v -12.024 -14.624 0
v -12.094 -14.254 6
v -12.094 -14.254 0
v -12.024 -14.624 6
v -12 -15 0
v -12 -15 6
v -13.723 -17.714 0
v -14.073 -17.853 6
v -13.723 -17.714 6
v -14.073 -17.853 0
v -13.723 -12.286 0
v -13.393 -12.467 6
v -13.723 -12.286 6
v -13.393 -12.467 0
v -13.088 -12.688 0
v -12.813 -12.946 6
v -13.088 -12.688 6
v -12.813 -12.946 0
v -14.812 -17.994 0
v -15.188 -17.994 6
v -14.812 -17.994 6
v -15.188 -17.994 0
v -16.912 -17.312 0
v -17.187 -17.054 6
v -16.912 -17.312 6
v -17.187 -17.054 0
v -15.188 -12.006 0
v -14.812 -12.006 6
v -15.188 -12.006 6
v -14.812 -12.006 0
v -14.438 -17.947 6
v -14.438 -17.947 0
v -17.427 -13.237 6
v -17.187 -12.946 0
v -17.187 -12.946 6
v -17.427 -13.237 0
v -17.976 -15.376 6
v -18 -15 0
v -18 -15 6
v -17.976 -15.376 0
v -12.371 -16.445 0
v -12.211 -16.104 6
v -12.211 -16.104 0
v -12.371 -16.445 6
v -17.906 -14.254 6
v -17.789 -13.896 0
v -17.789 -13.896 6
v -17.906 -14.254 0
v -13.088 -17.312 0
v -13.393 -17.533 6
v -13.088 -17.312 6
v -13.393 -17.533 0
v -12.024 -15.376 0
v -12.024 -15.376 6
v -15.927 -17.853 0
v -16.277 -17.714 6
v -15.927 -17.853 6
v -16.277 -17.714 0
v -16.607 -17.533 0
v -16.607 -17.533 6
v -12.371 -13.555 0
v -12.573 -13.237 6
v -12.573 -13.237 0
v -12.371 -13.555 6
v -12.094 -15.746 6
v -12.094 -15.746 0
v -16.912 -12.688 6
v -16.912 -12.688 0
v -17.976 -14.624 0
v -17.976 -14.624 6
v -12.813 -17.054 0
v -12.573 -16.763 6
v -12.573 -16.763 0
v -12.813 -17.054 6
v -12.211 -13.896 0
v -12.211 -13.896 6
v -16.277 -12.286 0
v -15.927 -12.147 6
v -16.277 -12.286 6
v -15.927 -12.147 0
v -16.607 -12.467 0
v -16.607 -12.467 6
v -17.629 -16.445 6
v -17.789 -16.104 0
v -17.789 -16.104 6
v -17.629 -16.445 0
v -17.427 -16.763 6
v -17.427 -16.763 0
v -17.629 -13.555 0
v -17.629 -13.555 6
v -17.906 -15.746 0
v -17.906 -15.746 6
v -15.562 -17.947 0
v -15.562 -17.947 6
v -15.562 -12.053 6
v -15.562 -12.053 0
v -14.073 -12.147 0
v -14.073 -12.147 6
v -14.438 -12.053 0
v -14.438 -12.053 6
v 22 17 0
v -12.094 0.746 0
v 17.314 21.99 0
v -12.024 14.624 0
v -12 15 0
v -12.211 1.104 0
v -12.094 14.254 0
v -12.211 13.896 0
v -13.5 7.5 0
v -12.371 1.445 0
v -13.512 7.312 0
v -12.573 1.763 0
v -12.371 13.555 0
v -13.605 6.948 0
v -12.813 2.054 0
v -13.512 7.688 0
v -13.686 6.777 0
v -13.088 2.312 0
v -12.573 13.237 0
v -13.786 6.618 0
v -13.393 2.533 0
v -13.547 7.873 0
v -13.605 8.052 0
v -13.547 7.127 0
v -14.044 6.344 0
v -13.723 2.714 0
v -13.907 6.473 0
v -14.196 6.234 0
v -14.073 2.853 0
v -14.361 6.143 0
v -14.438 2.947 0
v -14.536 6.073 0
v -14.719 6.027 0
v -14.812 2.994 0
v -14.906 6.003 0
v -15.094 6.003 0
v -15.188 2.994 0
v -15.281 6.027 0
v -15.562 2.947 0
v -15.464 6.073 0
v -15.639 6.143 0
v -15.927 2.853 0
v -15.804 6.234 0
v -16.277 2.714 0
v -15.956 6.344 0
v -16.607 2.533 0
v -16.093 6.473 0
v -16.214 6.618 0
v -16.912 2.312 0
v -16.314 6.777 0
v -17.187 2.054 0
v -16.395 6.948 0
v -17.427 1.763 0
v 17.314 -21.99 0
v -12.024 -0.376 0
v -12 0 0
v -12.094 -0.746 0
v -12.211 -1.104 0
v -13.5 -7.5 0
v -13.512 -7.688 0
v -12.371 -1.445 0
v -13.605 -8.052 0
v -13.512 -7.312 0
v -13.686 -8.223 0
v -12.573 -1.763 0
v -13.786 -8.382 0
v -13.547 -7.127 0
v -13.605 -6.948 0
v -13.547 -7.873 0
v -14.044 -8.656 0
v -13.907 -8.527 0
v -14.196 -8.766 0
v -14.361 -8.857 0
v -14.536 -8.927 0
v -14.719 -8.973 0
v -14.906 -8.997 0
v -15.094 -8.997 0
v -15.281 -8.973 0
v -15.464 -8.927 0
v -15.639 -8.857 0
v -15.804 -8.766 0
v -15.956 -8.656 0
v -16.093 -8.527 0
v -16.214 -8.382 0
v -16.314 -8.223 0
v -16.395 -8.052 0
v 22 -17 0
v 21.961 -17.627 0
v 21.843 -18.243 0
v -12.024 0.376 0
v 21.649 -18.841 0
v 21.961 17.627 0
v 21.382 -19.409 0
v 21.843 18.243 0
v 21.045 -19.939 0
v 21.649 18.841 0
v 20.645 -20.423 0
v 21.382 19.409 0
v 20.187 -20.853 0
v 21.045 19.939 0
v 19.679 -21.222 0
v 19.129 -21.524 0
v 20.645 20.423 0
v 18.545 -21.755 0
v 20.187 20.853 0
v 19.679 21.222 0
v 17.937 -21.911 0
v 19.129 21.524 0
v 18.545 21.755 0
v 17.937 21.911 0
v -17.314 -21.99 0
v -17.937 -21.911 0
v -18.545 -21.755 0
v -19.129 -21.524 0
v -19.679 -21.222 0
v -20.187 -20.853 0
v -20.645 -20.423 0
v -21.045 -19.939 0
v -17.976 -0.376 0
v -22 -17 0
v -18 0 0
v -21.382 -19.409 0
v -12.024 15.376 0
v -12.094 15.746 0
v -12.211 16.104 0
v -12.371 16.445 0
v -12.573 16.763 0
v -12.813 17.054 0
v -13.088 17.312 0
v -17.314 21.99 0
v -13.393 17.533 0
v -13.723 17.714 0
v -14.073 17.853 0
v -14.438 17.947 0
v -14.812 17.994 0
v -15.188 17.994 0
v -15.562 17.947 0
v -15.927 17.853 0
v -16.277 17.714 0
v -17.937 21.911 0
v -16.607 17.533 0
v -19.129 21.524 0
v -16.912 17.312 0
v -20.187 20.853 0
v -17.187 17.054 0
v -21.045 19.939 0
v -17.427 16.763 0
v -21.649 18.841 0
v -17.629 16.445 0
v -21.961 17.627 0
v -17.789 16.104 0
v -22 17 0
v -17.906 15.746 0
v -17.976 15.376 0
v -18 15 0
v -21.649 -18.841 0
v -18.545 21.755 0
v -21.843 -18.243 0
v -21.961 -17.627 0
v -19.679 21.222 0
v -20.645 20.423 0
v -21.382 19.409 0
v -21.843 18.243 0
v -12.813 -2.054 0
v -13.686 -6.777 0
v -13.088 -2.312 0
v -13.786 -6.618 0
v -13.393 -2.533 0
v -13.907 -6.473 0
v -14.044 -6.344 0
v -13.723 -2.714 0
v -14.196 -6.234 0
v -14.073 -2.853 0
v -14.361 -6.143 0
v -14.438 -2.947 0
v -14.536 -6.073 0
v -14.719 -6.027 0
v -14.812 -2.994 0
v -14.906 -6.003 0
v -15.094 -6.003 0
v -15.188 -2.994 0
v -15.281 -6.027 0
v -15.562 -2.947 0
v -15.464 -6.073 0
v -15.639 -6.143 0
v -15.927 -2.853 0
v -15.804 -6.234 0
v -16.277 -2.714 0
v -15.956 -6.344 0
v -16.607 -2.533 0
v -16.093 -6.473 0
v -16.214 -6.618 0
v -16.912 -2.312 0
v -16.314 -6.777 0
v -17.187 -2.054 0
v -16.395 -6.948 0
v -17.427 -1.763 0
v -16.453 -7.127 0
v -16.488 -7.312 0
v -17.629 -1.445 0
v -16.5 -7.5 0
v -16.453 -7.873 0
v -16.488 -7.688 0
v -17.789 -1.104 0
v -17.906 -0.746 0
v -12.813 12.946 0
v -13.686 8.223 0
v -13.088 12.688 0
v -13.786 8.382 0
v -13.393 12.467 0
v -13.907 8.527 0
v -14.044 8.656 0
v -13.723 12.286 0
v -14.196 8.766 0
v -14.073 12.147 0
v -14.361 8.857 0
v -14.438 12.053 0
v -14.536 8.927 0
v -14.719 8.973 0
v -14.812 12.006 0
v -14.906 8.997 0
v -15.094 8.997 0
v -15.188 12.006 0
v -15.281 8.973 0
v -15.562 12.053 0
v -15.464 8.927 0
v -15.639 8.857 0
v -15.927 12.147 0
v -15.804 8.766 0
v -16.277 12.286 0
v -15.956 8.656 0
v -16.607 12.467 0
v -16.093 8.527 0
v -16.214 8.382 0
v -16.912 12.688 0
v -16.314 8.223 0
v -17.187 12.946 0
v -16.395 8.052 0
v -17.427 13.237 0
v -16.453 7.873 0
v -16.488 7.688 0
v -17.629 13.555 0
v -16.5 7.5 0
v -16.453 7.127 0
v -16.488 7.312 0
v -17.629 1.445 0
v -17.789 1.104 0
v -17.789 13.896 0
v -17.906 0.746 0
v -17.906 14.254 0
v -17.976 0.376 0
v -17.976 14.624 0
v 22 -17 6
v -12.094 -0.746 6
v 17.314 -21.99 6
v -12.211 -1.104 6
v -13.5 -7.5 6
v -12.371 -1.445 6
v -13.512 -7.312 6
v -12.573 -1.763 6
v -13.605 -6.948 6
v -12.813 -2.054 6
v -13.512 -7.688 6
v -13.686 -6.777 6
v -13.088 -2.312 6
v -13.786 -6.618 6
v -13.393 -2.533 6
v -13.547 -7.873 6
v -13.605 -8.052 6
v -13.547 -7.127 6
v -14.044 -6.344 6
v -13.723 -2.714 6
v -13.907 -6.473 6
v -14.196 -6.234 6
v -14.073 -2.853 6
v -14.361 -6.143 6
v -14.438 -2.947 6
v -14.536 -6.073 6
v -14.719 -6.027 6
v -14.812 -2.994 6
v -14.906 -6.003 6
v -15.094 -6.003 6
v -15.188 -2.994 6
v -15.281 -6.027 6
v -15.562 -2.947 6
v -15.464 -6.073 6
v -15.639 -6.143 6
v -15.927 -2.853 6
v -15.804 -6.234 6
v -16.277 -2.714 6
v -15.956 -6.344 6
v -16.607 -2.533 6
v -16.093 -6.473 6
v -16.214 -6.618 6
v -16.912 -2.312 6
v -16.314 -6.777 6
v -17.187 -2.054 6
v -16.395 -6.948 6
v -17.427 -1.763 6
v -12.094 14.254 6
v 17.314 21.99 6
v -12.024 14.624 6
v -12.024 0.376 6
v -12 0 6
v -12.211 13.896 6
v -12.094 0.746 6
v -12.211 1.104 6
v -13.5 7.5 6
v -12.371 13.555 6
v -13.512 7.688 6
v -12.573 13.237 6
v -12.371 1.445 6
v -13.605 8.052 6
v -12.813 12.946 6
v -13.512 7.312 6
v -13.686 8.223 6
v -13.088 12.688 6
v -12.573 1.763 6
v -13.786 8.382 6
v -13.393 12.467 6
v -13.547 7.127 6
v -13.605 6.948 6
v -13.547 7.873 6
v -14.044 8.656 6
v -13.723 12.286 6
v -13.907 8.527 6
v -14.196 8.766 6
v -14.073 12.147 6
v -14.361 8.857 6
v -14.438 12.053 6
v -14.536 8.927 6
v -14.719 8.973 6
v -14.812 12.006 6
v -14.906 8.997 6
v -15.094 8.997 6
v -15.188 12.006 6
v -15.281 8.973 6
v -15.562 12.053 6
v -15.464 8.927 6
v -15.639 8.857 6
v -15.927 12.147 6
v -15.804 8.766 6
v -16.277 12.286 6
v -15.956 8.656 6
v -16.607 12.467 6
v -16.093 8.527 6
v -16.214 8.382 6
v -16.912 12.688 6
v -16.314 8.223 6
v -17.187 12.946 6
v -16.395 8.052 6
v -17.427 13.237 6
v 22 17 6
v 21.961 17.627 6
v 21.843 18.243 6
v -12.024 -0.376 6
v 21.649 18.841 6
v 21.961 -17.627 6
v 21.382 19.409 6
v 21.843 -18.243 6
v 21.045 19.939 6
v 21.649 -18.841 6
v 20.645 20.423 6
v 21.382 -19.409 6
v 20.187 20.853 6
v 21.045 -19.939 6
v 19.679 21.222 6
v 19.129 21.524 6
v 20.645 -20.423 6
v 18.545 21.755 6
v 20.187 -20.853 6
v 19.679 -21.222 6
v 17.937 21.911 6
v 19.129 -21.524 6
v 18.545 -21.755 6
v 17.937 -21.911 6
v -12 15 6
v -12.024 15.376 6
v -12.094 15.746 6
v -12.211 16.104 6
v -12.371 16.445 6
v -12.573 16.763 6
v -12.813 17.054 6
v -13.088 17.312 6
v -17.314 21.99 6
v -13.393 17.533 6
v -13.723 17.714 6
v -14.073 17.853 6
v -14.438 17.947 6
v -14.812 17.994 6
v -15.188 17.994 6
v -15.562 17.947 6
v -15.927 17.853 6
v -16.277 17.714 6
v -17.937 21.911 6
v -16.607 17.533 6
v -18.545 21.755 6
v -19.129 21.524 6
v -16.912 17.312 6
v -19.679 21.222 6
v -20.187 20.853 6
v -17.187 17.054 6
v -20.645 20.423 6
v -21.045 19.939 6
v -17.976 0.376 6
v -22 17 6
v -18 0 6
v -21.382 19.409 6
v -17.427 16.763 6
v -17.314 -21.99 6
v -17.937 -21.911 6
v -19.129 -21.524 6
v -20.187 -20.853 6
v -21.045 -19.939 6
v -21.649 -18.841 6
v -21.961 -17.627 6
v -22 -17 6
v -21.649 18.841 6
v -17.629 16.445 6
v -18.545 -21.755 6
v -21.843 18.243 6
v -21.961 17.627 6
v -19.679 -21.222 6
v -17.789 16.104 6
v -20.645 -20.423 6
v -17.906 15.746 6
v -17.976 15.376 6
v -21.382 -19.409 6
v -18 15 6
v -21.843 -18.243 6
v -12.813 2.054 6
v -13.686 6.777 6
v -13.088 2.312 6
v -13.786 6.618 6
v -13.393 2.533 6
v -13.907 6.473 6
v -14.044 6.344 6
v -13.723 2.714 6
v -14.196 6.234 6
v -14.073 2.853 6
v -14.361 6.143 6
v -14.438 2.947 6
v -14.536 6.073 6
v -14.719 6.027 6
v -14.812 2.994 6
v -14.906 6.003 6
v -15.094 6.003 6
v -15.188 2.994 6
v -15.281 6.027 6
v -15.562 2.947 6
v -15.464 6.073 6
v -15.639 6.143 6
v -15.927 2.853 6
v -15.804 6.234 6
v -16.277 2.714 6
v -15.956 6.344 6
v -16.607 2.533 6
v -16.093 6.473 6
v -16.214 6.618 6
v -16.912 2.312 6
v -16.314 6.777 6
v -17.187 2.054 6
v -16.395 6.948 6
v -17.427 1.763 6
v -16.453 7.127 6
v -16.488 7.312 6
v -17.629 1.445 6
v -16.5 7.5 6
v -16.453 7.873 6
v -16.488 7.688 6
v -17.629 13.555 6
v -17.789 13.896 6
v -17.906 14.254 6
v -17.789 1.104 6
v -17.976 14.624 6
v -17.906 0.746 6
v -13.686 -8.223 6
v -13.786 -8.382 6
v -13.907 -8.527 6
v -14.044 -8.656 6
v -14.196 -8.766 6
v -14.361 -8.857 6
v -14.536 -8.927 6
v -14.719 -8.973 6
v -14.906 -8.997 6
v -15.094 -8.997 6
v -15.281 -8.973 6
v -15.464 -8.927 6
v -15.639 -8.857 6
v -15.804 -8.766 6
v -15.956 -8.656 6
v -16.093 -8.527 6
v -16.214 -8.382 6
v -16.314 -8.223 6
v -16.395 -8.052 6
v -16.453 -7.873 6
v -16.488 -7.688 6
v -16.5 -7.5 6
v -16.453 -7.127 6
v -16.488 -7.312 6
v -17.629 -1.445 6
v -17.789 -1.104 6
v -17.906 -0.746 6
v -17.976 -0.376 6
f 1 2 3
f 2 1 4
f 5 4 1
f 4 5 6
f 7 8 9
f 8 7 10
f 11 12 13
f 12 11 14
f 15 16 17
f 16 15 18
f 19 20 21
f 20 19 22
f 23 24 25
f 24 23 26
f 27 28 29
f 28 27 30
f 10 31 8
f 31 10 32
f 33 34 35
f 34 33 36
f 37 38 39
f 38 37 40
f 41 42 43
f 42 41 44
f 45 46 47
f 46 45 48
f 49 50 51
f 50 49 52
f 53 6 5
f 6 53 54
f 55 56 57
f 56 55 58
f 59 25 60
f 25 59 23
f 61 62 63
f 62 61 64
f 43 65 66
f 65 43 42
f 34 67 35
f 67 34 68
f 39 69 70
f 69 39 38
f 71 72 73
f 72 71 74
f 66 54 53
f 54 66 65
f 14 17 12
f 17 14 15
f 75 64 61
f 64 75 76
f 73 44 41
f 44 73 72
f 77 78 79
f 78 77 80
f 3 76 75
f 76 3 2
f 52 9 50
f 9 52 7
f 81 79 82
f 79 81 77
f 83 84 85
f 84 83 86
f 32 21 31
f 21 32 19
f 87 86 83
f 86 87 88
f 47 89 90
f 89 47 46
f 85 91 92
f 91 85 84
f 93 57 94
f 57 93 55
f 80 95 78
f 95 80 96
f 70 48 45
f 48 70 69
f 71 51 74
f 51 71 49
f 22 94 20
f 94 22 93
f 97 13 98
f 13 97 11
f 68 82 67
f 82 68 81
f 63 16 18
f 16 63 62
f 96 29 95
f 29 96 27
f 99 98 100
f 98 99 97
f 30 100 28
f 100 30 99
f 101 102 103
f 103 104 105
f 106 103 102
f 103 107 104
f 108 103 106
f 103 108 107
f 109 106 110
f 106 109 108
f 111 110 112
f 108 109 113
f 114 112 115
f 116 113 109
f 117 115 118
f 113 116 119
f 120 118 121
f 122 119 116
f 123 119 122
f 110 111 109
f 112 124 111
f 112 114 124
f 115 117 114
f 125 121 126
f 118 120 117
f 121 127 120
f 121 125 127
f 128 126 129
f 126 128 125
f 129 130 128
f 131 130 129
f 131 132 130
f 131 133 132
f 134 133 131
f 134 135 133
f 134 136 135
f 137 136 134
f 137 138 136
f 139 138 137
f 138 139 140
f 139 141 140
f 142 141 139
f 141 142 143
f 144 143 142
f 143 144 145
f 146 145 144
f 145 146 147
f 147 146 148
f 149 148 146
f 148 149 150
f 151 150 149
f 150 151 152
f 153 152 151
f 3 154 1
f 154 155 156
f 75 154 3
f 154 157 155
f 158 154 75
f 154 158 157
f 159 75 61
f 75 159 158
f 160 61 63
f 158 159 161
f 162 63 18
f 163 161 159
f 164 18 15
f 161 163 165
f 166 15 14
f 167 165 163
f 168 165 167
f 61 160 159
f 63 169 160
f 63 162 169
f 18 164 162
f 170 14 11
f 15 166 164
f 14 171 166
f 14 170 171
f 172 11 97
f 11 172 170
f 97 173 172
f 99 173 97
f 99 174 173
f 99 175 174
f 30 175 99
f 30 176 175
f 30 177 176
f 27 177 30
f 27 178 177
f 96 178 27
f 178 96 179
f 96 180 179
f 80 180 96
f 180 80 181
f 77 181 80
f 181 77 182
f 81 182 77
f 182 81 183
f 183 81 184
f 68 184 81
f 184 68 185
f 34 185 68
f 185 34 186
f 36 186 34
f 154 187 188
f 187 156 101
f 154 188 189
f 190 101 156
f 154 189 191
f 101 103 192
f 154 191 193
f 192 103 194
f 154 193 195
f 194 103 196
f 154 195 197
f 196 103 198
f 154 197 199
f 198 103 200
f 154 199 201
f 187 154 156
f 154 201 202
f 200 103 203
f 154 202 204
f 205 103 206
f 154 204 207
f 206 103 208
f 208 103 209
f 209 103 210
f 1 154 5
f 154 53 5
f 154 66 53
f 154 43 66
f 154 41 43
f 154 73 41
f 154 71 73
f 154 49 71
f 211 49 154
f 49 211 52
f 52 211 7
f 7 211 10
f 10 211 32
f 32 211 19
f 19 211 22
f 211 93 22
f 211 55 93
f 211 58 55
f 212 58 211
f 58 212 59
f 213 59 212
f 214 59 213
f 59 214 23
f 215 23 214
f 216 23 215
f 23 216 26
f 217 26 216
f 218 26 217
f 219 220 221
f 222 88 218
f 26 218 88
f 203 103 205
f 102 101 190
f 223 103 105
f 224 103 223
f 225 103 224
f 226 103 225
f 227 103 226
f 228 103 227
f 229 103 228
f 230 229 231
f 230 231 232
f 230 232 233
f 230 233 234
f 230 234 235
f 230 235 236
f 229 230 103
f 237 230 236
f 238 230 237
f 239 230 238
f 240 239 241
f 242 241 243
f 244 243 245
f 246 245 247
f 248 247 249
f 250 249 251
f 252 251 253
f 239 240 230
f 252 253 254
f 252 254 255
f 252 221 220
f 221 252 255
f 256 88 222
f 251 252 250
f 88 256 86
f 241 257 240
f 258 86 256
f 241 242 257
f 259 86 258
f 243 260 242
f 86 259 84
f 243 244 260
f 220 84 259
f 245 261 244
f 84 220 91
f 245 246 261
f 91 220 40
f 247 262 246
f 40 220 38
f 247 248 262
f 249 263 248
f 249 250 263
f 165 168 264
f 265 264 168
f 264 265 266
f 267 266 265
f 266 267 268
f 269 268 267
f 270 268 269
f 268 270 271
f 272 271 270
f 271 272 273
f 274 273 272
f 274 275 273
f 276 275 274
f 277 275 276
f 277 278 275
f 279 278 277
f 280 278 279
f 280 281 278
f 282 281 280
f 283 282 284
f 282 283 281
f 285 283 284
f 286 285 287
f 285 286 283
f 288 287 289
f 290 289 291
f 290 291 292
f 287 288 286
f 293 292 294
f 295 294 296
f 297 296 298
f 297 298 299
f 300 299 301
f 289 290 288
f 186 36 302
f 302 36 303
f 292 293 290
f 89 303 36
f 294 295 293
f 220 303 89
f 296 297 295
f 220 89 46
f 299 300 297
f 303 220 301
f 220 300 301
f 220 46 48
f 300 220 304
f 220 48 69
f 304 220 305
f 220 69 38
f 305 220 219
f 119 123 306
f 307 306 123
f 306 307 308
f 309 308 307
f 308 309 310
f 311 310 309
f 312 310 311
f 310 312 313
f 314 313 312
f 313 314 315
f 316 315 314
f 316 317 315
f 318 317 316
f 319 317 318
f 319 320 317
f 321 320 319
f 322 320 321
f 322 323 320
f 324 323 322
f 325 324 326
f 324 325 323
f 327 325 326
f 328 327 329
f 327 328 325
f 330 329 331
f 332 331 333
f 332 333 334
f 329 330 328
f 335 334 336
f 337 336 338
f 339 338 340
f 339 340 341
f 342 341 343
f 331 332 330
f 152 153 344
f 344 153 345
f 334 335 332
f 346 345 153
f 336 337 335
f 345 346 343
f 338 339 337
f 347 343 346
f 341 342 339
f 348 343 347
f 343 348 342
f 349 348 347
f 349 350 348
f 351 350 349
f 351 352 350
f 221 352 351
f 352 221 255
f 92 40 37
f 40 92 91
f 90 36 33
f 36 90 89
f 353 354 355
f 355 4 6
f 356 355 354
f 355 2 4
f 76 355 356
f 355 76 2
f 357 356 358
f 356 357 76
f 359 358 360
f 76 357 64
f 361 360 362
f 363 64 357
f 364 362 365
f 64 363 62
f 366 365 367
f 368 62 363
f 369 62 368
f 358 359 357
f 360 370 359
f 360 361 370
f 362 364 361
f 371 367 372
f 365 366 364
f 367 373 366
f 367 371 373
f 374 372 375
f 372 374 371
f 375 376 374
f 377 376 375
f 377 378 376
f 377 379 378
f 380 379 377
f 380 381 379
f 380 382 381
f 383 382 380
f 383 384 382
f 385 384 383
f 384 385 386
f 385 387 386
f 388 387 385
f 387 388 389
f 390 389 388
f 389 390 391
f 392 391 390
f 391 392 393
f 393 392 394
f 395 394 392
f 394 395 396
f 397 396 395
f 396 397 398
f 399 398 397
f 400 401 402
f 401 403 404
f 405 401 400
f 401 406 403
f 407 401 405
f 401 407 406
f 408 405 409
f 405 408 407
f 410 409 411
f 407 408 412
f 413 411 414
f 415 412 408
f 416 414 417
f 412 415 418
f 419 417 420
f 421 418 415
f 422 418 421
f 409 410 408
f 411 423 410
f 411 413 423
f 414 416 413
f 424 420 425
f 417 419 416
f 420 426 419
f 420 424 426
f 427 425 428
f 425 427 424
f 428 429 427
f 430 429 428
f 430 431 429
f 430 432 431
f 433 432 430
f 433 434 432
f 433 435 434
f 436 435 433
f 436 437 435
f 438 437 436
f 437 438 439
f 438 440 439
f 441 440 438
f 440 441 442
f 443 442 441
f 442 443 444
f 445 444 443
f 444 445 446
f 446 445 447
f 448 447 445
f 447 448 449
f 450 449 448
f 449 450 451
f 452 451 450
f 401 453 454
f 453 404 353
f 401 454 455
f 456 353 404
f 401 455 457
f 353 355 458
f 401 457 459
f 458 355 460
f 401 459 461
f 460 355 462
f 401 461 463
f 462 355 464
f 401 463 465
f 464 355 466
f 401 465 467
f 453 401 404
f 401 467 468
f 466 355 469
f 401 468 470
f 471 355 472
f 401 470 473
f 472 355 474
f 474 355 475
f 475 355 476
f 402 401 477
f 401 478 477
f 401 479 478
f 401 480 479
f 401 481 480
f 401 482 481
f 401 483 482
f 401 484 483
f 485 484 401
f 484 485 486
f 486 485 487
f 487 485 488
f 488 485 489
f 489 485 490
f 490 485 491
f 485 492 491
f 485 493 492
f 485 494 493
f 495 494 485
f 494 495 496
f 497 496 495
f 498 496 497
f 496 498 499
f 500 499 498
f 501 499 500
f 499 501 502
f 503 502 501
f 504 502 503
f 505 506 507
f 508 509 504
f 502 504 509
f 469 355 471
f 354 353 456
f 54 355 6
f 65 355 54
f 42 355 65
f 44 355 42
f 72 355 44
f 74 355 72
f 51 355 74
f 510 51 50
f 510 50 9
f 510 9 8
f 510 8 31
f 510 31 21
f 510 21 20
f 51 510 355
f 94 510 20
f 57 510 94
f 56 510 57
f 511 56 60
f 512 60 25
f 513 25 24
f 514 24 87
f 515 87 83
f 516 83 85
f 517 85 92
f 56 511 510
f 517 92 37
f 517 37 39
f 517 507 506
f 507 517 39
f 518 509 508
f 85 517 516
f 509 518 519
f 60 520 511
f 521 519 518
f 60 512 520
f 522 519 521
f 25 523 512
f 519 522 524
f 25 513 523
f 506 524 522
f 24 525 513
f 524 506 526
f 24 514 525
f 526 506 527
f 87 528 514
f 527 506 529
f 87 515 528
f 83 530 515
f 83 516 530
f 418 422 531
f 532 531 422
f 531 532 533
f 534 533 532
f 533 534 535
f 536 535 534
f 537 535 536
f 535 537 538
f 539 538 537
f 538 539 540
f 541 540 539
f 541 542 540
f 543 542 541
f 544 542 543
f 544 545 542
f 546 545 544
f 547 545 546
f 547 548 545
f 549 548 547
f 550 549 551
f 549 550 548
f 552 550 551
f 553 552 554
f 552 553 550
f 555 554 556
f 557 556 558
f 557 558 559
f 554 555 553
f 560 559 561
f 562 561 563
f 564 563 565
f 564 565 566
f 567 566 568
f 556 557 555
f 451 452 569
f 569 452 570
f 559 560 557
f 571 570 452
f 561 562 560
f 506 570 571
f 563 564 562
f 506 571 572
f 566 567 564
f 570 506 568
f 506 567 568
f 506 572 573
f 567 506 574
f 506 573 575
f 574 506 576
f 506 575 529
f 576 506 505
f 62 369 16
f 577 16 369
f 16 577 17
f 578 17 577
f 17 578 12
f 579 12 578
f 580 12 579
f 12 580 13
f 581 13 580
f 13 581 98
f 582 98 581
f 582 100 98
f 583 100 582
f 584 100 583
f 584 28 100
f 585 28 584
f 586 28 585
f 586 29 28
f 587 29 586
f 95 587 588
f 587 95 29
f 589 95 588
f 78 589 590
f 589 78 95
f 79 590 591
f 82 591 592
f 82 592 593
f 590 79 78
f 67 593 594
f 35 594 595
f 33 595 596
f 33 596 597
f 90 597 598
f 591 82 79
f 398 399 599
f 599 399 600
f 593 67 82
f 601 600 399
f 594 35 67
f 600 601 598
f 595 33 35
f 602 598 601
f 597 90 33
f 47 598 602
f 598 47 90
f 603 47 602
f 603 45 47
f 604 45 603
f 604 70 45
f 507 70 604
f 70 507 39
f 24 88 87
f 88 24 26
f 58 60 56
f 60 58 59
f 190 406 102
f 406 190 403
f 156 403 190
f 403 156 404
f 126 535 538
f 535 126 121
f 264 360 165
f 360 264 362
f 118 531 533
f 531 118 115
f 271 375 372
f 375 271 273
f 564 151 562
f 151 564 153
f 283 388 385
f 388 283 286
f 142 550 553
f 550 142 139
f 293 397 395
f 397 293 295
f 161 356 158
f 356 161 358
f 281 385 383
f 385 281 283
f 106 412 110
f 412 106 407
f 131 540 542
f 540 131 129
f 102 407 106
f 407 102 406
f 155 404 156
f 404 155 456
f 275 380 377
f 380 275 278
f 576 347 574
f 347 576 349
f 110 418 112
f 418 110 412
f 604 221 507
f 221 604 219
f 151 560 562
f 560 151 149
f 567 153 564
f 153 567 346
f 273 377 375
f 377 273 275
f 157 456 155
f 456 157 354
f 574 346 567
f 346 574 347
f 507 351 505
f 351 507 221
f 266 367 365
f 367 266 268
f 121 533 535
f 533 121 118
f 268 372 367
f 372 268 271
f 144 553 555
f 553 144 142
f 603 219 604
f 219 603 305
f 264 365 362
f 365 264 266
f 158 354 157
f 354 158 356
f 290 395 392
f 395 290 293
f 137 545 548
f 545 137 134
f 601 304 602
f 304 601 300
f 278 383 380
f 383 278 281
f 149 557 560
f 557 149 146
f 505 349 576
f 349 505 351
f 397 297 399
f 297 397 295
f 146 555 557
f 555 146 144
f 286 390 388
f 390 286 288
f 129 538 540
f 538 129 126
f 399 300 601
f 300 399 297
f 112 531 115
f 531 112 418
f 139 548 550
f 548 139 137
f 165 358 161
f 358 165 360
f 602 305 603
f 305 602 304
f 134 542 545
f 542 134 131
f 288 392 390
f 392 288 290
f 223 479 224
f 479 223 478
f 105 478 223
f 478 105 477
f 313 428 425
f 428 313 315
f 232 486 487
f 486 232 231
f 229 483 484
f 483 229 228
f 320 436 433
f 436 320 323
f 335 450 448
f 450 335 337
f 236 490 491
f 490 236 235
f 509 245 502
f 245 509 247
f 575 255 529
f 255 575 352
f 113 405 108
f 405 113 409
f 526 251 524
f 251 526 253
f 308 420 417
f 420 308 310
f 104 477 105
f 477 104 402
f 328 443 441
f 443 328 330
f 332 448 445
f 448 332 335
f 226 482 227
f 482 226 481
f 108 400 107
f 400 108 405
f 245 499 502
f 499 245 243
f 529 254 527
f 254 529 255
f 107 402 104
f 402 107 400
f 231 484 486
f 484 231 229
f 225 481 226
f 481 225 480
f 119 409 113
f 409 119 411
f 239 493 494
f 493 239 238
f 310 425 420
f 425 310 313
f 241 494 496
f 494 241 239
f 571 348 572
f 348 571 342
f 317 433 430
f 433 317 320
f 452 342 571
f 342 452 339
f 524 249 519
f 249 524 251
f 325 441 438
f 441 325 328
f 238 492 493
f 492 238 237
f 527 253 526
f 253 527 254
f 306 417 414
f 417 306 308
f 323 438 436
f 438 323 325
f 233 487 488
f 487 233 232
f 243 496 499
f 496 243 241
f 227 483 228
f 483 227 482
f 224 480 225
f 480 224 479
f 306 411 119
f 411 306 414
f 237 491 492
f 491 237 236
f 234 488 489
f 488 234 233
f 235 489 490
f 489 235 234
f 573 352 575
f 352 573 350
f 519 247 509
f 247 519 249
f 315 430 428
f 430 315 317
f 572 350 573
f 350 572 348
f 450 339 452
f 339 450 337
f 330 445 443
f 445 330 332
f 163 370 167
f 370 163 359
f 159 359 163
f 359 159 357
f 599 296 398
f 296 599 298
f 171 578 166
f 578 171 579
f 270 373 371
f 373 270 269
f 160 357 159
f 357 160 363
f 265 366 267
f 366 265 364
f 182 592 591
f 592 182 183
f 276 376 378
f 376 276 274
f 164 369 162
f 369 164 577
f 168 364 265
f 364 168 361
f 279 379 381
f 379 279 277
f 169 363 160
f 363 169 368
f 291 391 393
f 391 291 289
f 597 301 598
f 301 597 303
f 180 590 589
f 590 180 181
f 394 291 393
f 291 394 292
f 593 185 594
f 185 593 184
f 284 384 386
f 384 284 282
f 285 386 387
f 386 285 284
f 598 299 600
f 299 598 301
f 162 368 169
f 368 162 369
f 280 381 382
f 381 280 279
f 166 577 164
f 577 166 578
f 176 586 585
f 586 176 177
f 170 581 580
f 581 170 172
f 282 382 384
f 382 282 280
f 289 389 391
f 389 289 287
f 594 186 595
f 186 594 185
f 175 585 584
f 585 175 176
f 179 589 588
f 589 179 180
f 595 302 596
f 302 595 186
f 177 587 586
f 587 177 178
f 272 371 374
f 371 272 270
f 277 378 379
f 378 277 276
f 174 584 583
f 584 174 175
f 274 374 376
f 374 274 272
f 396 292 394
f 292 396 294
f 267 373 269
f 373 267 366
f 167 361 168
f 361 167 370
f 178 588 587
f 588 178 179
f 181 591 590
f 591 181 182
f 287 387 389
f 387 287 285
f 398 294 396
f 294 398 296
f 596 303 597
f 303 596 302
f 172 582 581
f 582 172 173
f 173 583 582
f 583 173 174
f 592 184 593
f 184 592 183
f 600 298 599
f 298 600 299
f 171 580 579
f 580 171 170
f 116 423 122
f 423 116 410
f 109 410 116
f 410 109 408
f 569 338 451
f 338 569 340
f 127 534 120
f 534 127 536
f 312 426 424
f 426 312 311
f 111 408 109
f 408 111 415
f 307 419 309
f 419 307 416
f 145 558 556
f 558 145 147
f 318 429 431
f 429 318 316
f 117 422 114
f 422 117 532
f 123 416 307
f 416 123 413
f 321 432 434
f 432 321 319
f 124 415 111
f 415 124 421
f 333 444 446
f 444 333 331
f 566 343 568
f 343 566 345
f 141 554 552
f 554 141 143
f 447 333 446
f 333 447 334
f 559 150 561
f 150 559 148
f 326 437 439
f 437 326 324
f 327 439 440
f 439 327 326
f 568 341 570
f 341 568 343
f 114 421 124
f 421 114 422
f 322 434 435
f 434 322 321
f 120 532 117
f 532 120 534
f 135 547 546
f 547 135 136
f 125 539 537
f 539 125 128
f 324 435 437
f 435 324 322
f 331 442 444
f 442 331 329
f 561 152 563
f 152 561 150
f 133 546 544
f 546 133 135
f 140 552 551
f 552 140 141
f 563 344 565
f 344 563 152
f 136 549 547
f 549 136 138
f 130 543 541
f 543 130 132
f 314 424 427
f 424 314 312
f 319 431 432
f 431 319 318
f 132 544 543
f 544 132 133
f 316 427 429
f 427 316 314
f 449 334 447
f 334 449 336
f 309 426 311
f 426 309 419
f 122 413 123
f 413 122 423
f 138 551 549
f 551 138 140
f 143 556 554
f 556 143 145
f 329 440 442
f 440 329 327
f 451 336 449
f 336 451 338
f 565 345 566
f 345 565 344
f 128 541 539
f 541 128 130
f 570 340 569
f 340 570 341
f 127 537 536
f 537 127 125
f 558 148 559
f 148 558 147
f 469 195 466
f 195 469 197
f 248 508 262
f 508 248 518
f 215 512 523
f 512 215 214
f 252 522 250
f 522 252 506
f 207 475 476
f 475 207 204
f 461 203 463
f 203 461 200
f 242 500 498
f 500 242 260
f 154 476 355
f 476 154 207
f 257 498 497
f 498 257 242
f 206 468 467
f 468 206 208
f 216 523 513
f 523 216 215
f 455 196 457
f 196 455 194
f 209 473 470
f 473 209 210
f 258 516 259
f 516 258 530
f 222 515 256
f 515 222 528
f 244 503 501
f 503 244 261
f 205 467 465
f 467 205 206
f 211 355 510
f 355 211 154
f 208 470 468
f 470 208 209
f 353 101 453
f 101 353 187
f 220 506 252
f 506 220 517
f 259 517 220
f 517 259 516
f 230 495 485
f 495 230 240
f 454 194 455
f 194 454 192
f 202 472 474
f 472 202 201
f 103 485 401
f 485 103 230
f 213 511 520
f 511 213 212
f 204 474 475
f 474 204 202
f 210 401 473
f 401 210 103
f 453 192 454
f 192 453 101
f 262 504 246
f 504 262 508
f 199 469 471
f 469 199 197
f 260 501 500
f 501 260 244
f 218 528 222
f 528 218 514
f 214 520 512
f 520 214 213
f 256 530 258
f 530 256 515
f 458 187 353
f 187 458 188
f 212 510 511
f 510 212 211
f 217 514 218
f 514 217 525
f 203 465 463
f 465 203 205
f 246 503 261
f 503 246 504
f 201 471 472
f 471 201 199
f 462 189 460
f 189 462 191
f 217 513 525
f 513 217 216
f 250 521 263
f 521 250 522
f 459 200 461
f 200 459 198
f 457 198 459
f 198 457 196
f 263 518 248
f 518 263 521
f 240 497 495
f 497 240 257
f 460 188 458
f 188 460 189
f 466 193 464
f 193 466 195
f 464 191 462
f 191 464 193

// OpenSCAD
$fn = 50;


difference() {
	union() {
		hull() {
			translate(v = [-17.0000000000, 17.0000000000, 0]) {
				cylinder(h = 6, r = 5);
			}
			translate(v = [17.0000000000, 17.0000000000, 0]) {
				cylinder(h = 6, r = 5);
			}
			translate(v = [-17.0000000000, -17.0000000000, 0]) {
				cylinder(h = 6, r = 5);
			}
			translate(v = [17.0000000000, -17.0000000000, 0]) {
				cylinder(h = 6, r = 5);
			}
		}
	}
	union() {
		translate(v = [-15.0000000000, -15.0000000000, 0]) {
			cylinder(h = 6, r = 3.0000000000);
		}
		translate(v = [-15.0000000000, 0.0000000000, 0]) {
			cylinder(h = 6, r = 3.0000000000);
		}
		translate(v = [-15.0000000000, 15.0000000000, 0]) {
			cylinder(h = 6, r = 3.0000000000);
		}
		translate(v = [-15.0000000000, -15.0000000000, 0]) {
			cylinder(h = 6, r = 1.5000000000);
		}
		translate(v = [-15.0000000000, -7.5000000000, 0]) {
			cylinder(h = 6, r = 1.5000000000);
		}
		translate(v = [-15.0000000000, 0.0000000000, 0]) {
			cylinder(h = 6, r = 1.5000000000);
		}
		translate(v = [-15.0000000000, 7.5000000000, 0]) {
			cylinder(h = 6, r = 1.5000000000);
		}
		translate(v = [-15.0000000000, 15.0000000000, 0]) {
			cylinder(h = 6, r = 1.5000000000);
		}
		translate(v = [-15.0000000000, -15.0000000000, 0]) {
			cylinder(h = 6, r = 1.5000000000);
		}
		translate(v = [-15.0000000000, -7.5000000000, 0]) {
			cylinder(h = 6, r = 1.5000000000);
		}
		translate(v = [-15.0000000000, 0.0000000000, 0]) {
			cylinder(h = 6, r = 1.5000000000);
		}
		translate(v = [-15.0000000000, 7.5000000000, 0]) {
			cylinder(h = 6, r = 1.5000000000);
		}
		translate(v = [-15.0000000000, 15.0000000000, 0]) {
			cylinder(h = 6, r = 1.5000000000);
		}
		translate(v = [-15.0000000000, -15.0000000000, 0]) {
			cylinder(h = 6, r = 1.5000000000);
		}
		translate(v = [-15.0000000000, -7.5000000000, 0]) {
			cylinder(h = 6, r = 1.5000000000);
		}
		translate(v = [-15.0000000000, 0.0000000000, 0]) {
			cylinder(h = 6, r = 1.5000000000);
		}
		translate(v = [-15.0000000000, 7.5000000000, 0]) {
			cylinder(h = 6, r = 1.5000000000);
		}
		translate(v = [-15.0000000000, 15.0000000000, 0]) {
			cylinder(h = 6, r = 1.5000000000);
		}
	}
}
